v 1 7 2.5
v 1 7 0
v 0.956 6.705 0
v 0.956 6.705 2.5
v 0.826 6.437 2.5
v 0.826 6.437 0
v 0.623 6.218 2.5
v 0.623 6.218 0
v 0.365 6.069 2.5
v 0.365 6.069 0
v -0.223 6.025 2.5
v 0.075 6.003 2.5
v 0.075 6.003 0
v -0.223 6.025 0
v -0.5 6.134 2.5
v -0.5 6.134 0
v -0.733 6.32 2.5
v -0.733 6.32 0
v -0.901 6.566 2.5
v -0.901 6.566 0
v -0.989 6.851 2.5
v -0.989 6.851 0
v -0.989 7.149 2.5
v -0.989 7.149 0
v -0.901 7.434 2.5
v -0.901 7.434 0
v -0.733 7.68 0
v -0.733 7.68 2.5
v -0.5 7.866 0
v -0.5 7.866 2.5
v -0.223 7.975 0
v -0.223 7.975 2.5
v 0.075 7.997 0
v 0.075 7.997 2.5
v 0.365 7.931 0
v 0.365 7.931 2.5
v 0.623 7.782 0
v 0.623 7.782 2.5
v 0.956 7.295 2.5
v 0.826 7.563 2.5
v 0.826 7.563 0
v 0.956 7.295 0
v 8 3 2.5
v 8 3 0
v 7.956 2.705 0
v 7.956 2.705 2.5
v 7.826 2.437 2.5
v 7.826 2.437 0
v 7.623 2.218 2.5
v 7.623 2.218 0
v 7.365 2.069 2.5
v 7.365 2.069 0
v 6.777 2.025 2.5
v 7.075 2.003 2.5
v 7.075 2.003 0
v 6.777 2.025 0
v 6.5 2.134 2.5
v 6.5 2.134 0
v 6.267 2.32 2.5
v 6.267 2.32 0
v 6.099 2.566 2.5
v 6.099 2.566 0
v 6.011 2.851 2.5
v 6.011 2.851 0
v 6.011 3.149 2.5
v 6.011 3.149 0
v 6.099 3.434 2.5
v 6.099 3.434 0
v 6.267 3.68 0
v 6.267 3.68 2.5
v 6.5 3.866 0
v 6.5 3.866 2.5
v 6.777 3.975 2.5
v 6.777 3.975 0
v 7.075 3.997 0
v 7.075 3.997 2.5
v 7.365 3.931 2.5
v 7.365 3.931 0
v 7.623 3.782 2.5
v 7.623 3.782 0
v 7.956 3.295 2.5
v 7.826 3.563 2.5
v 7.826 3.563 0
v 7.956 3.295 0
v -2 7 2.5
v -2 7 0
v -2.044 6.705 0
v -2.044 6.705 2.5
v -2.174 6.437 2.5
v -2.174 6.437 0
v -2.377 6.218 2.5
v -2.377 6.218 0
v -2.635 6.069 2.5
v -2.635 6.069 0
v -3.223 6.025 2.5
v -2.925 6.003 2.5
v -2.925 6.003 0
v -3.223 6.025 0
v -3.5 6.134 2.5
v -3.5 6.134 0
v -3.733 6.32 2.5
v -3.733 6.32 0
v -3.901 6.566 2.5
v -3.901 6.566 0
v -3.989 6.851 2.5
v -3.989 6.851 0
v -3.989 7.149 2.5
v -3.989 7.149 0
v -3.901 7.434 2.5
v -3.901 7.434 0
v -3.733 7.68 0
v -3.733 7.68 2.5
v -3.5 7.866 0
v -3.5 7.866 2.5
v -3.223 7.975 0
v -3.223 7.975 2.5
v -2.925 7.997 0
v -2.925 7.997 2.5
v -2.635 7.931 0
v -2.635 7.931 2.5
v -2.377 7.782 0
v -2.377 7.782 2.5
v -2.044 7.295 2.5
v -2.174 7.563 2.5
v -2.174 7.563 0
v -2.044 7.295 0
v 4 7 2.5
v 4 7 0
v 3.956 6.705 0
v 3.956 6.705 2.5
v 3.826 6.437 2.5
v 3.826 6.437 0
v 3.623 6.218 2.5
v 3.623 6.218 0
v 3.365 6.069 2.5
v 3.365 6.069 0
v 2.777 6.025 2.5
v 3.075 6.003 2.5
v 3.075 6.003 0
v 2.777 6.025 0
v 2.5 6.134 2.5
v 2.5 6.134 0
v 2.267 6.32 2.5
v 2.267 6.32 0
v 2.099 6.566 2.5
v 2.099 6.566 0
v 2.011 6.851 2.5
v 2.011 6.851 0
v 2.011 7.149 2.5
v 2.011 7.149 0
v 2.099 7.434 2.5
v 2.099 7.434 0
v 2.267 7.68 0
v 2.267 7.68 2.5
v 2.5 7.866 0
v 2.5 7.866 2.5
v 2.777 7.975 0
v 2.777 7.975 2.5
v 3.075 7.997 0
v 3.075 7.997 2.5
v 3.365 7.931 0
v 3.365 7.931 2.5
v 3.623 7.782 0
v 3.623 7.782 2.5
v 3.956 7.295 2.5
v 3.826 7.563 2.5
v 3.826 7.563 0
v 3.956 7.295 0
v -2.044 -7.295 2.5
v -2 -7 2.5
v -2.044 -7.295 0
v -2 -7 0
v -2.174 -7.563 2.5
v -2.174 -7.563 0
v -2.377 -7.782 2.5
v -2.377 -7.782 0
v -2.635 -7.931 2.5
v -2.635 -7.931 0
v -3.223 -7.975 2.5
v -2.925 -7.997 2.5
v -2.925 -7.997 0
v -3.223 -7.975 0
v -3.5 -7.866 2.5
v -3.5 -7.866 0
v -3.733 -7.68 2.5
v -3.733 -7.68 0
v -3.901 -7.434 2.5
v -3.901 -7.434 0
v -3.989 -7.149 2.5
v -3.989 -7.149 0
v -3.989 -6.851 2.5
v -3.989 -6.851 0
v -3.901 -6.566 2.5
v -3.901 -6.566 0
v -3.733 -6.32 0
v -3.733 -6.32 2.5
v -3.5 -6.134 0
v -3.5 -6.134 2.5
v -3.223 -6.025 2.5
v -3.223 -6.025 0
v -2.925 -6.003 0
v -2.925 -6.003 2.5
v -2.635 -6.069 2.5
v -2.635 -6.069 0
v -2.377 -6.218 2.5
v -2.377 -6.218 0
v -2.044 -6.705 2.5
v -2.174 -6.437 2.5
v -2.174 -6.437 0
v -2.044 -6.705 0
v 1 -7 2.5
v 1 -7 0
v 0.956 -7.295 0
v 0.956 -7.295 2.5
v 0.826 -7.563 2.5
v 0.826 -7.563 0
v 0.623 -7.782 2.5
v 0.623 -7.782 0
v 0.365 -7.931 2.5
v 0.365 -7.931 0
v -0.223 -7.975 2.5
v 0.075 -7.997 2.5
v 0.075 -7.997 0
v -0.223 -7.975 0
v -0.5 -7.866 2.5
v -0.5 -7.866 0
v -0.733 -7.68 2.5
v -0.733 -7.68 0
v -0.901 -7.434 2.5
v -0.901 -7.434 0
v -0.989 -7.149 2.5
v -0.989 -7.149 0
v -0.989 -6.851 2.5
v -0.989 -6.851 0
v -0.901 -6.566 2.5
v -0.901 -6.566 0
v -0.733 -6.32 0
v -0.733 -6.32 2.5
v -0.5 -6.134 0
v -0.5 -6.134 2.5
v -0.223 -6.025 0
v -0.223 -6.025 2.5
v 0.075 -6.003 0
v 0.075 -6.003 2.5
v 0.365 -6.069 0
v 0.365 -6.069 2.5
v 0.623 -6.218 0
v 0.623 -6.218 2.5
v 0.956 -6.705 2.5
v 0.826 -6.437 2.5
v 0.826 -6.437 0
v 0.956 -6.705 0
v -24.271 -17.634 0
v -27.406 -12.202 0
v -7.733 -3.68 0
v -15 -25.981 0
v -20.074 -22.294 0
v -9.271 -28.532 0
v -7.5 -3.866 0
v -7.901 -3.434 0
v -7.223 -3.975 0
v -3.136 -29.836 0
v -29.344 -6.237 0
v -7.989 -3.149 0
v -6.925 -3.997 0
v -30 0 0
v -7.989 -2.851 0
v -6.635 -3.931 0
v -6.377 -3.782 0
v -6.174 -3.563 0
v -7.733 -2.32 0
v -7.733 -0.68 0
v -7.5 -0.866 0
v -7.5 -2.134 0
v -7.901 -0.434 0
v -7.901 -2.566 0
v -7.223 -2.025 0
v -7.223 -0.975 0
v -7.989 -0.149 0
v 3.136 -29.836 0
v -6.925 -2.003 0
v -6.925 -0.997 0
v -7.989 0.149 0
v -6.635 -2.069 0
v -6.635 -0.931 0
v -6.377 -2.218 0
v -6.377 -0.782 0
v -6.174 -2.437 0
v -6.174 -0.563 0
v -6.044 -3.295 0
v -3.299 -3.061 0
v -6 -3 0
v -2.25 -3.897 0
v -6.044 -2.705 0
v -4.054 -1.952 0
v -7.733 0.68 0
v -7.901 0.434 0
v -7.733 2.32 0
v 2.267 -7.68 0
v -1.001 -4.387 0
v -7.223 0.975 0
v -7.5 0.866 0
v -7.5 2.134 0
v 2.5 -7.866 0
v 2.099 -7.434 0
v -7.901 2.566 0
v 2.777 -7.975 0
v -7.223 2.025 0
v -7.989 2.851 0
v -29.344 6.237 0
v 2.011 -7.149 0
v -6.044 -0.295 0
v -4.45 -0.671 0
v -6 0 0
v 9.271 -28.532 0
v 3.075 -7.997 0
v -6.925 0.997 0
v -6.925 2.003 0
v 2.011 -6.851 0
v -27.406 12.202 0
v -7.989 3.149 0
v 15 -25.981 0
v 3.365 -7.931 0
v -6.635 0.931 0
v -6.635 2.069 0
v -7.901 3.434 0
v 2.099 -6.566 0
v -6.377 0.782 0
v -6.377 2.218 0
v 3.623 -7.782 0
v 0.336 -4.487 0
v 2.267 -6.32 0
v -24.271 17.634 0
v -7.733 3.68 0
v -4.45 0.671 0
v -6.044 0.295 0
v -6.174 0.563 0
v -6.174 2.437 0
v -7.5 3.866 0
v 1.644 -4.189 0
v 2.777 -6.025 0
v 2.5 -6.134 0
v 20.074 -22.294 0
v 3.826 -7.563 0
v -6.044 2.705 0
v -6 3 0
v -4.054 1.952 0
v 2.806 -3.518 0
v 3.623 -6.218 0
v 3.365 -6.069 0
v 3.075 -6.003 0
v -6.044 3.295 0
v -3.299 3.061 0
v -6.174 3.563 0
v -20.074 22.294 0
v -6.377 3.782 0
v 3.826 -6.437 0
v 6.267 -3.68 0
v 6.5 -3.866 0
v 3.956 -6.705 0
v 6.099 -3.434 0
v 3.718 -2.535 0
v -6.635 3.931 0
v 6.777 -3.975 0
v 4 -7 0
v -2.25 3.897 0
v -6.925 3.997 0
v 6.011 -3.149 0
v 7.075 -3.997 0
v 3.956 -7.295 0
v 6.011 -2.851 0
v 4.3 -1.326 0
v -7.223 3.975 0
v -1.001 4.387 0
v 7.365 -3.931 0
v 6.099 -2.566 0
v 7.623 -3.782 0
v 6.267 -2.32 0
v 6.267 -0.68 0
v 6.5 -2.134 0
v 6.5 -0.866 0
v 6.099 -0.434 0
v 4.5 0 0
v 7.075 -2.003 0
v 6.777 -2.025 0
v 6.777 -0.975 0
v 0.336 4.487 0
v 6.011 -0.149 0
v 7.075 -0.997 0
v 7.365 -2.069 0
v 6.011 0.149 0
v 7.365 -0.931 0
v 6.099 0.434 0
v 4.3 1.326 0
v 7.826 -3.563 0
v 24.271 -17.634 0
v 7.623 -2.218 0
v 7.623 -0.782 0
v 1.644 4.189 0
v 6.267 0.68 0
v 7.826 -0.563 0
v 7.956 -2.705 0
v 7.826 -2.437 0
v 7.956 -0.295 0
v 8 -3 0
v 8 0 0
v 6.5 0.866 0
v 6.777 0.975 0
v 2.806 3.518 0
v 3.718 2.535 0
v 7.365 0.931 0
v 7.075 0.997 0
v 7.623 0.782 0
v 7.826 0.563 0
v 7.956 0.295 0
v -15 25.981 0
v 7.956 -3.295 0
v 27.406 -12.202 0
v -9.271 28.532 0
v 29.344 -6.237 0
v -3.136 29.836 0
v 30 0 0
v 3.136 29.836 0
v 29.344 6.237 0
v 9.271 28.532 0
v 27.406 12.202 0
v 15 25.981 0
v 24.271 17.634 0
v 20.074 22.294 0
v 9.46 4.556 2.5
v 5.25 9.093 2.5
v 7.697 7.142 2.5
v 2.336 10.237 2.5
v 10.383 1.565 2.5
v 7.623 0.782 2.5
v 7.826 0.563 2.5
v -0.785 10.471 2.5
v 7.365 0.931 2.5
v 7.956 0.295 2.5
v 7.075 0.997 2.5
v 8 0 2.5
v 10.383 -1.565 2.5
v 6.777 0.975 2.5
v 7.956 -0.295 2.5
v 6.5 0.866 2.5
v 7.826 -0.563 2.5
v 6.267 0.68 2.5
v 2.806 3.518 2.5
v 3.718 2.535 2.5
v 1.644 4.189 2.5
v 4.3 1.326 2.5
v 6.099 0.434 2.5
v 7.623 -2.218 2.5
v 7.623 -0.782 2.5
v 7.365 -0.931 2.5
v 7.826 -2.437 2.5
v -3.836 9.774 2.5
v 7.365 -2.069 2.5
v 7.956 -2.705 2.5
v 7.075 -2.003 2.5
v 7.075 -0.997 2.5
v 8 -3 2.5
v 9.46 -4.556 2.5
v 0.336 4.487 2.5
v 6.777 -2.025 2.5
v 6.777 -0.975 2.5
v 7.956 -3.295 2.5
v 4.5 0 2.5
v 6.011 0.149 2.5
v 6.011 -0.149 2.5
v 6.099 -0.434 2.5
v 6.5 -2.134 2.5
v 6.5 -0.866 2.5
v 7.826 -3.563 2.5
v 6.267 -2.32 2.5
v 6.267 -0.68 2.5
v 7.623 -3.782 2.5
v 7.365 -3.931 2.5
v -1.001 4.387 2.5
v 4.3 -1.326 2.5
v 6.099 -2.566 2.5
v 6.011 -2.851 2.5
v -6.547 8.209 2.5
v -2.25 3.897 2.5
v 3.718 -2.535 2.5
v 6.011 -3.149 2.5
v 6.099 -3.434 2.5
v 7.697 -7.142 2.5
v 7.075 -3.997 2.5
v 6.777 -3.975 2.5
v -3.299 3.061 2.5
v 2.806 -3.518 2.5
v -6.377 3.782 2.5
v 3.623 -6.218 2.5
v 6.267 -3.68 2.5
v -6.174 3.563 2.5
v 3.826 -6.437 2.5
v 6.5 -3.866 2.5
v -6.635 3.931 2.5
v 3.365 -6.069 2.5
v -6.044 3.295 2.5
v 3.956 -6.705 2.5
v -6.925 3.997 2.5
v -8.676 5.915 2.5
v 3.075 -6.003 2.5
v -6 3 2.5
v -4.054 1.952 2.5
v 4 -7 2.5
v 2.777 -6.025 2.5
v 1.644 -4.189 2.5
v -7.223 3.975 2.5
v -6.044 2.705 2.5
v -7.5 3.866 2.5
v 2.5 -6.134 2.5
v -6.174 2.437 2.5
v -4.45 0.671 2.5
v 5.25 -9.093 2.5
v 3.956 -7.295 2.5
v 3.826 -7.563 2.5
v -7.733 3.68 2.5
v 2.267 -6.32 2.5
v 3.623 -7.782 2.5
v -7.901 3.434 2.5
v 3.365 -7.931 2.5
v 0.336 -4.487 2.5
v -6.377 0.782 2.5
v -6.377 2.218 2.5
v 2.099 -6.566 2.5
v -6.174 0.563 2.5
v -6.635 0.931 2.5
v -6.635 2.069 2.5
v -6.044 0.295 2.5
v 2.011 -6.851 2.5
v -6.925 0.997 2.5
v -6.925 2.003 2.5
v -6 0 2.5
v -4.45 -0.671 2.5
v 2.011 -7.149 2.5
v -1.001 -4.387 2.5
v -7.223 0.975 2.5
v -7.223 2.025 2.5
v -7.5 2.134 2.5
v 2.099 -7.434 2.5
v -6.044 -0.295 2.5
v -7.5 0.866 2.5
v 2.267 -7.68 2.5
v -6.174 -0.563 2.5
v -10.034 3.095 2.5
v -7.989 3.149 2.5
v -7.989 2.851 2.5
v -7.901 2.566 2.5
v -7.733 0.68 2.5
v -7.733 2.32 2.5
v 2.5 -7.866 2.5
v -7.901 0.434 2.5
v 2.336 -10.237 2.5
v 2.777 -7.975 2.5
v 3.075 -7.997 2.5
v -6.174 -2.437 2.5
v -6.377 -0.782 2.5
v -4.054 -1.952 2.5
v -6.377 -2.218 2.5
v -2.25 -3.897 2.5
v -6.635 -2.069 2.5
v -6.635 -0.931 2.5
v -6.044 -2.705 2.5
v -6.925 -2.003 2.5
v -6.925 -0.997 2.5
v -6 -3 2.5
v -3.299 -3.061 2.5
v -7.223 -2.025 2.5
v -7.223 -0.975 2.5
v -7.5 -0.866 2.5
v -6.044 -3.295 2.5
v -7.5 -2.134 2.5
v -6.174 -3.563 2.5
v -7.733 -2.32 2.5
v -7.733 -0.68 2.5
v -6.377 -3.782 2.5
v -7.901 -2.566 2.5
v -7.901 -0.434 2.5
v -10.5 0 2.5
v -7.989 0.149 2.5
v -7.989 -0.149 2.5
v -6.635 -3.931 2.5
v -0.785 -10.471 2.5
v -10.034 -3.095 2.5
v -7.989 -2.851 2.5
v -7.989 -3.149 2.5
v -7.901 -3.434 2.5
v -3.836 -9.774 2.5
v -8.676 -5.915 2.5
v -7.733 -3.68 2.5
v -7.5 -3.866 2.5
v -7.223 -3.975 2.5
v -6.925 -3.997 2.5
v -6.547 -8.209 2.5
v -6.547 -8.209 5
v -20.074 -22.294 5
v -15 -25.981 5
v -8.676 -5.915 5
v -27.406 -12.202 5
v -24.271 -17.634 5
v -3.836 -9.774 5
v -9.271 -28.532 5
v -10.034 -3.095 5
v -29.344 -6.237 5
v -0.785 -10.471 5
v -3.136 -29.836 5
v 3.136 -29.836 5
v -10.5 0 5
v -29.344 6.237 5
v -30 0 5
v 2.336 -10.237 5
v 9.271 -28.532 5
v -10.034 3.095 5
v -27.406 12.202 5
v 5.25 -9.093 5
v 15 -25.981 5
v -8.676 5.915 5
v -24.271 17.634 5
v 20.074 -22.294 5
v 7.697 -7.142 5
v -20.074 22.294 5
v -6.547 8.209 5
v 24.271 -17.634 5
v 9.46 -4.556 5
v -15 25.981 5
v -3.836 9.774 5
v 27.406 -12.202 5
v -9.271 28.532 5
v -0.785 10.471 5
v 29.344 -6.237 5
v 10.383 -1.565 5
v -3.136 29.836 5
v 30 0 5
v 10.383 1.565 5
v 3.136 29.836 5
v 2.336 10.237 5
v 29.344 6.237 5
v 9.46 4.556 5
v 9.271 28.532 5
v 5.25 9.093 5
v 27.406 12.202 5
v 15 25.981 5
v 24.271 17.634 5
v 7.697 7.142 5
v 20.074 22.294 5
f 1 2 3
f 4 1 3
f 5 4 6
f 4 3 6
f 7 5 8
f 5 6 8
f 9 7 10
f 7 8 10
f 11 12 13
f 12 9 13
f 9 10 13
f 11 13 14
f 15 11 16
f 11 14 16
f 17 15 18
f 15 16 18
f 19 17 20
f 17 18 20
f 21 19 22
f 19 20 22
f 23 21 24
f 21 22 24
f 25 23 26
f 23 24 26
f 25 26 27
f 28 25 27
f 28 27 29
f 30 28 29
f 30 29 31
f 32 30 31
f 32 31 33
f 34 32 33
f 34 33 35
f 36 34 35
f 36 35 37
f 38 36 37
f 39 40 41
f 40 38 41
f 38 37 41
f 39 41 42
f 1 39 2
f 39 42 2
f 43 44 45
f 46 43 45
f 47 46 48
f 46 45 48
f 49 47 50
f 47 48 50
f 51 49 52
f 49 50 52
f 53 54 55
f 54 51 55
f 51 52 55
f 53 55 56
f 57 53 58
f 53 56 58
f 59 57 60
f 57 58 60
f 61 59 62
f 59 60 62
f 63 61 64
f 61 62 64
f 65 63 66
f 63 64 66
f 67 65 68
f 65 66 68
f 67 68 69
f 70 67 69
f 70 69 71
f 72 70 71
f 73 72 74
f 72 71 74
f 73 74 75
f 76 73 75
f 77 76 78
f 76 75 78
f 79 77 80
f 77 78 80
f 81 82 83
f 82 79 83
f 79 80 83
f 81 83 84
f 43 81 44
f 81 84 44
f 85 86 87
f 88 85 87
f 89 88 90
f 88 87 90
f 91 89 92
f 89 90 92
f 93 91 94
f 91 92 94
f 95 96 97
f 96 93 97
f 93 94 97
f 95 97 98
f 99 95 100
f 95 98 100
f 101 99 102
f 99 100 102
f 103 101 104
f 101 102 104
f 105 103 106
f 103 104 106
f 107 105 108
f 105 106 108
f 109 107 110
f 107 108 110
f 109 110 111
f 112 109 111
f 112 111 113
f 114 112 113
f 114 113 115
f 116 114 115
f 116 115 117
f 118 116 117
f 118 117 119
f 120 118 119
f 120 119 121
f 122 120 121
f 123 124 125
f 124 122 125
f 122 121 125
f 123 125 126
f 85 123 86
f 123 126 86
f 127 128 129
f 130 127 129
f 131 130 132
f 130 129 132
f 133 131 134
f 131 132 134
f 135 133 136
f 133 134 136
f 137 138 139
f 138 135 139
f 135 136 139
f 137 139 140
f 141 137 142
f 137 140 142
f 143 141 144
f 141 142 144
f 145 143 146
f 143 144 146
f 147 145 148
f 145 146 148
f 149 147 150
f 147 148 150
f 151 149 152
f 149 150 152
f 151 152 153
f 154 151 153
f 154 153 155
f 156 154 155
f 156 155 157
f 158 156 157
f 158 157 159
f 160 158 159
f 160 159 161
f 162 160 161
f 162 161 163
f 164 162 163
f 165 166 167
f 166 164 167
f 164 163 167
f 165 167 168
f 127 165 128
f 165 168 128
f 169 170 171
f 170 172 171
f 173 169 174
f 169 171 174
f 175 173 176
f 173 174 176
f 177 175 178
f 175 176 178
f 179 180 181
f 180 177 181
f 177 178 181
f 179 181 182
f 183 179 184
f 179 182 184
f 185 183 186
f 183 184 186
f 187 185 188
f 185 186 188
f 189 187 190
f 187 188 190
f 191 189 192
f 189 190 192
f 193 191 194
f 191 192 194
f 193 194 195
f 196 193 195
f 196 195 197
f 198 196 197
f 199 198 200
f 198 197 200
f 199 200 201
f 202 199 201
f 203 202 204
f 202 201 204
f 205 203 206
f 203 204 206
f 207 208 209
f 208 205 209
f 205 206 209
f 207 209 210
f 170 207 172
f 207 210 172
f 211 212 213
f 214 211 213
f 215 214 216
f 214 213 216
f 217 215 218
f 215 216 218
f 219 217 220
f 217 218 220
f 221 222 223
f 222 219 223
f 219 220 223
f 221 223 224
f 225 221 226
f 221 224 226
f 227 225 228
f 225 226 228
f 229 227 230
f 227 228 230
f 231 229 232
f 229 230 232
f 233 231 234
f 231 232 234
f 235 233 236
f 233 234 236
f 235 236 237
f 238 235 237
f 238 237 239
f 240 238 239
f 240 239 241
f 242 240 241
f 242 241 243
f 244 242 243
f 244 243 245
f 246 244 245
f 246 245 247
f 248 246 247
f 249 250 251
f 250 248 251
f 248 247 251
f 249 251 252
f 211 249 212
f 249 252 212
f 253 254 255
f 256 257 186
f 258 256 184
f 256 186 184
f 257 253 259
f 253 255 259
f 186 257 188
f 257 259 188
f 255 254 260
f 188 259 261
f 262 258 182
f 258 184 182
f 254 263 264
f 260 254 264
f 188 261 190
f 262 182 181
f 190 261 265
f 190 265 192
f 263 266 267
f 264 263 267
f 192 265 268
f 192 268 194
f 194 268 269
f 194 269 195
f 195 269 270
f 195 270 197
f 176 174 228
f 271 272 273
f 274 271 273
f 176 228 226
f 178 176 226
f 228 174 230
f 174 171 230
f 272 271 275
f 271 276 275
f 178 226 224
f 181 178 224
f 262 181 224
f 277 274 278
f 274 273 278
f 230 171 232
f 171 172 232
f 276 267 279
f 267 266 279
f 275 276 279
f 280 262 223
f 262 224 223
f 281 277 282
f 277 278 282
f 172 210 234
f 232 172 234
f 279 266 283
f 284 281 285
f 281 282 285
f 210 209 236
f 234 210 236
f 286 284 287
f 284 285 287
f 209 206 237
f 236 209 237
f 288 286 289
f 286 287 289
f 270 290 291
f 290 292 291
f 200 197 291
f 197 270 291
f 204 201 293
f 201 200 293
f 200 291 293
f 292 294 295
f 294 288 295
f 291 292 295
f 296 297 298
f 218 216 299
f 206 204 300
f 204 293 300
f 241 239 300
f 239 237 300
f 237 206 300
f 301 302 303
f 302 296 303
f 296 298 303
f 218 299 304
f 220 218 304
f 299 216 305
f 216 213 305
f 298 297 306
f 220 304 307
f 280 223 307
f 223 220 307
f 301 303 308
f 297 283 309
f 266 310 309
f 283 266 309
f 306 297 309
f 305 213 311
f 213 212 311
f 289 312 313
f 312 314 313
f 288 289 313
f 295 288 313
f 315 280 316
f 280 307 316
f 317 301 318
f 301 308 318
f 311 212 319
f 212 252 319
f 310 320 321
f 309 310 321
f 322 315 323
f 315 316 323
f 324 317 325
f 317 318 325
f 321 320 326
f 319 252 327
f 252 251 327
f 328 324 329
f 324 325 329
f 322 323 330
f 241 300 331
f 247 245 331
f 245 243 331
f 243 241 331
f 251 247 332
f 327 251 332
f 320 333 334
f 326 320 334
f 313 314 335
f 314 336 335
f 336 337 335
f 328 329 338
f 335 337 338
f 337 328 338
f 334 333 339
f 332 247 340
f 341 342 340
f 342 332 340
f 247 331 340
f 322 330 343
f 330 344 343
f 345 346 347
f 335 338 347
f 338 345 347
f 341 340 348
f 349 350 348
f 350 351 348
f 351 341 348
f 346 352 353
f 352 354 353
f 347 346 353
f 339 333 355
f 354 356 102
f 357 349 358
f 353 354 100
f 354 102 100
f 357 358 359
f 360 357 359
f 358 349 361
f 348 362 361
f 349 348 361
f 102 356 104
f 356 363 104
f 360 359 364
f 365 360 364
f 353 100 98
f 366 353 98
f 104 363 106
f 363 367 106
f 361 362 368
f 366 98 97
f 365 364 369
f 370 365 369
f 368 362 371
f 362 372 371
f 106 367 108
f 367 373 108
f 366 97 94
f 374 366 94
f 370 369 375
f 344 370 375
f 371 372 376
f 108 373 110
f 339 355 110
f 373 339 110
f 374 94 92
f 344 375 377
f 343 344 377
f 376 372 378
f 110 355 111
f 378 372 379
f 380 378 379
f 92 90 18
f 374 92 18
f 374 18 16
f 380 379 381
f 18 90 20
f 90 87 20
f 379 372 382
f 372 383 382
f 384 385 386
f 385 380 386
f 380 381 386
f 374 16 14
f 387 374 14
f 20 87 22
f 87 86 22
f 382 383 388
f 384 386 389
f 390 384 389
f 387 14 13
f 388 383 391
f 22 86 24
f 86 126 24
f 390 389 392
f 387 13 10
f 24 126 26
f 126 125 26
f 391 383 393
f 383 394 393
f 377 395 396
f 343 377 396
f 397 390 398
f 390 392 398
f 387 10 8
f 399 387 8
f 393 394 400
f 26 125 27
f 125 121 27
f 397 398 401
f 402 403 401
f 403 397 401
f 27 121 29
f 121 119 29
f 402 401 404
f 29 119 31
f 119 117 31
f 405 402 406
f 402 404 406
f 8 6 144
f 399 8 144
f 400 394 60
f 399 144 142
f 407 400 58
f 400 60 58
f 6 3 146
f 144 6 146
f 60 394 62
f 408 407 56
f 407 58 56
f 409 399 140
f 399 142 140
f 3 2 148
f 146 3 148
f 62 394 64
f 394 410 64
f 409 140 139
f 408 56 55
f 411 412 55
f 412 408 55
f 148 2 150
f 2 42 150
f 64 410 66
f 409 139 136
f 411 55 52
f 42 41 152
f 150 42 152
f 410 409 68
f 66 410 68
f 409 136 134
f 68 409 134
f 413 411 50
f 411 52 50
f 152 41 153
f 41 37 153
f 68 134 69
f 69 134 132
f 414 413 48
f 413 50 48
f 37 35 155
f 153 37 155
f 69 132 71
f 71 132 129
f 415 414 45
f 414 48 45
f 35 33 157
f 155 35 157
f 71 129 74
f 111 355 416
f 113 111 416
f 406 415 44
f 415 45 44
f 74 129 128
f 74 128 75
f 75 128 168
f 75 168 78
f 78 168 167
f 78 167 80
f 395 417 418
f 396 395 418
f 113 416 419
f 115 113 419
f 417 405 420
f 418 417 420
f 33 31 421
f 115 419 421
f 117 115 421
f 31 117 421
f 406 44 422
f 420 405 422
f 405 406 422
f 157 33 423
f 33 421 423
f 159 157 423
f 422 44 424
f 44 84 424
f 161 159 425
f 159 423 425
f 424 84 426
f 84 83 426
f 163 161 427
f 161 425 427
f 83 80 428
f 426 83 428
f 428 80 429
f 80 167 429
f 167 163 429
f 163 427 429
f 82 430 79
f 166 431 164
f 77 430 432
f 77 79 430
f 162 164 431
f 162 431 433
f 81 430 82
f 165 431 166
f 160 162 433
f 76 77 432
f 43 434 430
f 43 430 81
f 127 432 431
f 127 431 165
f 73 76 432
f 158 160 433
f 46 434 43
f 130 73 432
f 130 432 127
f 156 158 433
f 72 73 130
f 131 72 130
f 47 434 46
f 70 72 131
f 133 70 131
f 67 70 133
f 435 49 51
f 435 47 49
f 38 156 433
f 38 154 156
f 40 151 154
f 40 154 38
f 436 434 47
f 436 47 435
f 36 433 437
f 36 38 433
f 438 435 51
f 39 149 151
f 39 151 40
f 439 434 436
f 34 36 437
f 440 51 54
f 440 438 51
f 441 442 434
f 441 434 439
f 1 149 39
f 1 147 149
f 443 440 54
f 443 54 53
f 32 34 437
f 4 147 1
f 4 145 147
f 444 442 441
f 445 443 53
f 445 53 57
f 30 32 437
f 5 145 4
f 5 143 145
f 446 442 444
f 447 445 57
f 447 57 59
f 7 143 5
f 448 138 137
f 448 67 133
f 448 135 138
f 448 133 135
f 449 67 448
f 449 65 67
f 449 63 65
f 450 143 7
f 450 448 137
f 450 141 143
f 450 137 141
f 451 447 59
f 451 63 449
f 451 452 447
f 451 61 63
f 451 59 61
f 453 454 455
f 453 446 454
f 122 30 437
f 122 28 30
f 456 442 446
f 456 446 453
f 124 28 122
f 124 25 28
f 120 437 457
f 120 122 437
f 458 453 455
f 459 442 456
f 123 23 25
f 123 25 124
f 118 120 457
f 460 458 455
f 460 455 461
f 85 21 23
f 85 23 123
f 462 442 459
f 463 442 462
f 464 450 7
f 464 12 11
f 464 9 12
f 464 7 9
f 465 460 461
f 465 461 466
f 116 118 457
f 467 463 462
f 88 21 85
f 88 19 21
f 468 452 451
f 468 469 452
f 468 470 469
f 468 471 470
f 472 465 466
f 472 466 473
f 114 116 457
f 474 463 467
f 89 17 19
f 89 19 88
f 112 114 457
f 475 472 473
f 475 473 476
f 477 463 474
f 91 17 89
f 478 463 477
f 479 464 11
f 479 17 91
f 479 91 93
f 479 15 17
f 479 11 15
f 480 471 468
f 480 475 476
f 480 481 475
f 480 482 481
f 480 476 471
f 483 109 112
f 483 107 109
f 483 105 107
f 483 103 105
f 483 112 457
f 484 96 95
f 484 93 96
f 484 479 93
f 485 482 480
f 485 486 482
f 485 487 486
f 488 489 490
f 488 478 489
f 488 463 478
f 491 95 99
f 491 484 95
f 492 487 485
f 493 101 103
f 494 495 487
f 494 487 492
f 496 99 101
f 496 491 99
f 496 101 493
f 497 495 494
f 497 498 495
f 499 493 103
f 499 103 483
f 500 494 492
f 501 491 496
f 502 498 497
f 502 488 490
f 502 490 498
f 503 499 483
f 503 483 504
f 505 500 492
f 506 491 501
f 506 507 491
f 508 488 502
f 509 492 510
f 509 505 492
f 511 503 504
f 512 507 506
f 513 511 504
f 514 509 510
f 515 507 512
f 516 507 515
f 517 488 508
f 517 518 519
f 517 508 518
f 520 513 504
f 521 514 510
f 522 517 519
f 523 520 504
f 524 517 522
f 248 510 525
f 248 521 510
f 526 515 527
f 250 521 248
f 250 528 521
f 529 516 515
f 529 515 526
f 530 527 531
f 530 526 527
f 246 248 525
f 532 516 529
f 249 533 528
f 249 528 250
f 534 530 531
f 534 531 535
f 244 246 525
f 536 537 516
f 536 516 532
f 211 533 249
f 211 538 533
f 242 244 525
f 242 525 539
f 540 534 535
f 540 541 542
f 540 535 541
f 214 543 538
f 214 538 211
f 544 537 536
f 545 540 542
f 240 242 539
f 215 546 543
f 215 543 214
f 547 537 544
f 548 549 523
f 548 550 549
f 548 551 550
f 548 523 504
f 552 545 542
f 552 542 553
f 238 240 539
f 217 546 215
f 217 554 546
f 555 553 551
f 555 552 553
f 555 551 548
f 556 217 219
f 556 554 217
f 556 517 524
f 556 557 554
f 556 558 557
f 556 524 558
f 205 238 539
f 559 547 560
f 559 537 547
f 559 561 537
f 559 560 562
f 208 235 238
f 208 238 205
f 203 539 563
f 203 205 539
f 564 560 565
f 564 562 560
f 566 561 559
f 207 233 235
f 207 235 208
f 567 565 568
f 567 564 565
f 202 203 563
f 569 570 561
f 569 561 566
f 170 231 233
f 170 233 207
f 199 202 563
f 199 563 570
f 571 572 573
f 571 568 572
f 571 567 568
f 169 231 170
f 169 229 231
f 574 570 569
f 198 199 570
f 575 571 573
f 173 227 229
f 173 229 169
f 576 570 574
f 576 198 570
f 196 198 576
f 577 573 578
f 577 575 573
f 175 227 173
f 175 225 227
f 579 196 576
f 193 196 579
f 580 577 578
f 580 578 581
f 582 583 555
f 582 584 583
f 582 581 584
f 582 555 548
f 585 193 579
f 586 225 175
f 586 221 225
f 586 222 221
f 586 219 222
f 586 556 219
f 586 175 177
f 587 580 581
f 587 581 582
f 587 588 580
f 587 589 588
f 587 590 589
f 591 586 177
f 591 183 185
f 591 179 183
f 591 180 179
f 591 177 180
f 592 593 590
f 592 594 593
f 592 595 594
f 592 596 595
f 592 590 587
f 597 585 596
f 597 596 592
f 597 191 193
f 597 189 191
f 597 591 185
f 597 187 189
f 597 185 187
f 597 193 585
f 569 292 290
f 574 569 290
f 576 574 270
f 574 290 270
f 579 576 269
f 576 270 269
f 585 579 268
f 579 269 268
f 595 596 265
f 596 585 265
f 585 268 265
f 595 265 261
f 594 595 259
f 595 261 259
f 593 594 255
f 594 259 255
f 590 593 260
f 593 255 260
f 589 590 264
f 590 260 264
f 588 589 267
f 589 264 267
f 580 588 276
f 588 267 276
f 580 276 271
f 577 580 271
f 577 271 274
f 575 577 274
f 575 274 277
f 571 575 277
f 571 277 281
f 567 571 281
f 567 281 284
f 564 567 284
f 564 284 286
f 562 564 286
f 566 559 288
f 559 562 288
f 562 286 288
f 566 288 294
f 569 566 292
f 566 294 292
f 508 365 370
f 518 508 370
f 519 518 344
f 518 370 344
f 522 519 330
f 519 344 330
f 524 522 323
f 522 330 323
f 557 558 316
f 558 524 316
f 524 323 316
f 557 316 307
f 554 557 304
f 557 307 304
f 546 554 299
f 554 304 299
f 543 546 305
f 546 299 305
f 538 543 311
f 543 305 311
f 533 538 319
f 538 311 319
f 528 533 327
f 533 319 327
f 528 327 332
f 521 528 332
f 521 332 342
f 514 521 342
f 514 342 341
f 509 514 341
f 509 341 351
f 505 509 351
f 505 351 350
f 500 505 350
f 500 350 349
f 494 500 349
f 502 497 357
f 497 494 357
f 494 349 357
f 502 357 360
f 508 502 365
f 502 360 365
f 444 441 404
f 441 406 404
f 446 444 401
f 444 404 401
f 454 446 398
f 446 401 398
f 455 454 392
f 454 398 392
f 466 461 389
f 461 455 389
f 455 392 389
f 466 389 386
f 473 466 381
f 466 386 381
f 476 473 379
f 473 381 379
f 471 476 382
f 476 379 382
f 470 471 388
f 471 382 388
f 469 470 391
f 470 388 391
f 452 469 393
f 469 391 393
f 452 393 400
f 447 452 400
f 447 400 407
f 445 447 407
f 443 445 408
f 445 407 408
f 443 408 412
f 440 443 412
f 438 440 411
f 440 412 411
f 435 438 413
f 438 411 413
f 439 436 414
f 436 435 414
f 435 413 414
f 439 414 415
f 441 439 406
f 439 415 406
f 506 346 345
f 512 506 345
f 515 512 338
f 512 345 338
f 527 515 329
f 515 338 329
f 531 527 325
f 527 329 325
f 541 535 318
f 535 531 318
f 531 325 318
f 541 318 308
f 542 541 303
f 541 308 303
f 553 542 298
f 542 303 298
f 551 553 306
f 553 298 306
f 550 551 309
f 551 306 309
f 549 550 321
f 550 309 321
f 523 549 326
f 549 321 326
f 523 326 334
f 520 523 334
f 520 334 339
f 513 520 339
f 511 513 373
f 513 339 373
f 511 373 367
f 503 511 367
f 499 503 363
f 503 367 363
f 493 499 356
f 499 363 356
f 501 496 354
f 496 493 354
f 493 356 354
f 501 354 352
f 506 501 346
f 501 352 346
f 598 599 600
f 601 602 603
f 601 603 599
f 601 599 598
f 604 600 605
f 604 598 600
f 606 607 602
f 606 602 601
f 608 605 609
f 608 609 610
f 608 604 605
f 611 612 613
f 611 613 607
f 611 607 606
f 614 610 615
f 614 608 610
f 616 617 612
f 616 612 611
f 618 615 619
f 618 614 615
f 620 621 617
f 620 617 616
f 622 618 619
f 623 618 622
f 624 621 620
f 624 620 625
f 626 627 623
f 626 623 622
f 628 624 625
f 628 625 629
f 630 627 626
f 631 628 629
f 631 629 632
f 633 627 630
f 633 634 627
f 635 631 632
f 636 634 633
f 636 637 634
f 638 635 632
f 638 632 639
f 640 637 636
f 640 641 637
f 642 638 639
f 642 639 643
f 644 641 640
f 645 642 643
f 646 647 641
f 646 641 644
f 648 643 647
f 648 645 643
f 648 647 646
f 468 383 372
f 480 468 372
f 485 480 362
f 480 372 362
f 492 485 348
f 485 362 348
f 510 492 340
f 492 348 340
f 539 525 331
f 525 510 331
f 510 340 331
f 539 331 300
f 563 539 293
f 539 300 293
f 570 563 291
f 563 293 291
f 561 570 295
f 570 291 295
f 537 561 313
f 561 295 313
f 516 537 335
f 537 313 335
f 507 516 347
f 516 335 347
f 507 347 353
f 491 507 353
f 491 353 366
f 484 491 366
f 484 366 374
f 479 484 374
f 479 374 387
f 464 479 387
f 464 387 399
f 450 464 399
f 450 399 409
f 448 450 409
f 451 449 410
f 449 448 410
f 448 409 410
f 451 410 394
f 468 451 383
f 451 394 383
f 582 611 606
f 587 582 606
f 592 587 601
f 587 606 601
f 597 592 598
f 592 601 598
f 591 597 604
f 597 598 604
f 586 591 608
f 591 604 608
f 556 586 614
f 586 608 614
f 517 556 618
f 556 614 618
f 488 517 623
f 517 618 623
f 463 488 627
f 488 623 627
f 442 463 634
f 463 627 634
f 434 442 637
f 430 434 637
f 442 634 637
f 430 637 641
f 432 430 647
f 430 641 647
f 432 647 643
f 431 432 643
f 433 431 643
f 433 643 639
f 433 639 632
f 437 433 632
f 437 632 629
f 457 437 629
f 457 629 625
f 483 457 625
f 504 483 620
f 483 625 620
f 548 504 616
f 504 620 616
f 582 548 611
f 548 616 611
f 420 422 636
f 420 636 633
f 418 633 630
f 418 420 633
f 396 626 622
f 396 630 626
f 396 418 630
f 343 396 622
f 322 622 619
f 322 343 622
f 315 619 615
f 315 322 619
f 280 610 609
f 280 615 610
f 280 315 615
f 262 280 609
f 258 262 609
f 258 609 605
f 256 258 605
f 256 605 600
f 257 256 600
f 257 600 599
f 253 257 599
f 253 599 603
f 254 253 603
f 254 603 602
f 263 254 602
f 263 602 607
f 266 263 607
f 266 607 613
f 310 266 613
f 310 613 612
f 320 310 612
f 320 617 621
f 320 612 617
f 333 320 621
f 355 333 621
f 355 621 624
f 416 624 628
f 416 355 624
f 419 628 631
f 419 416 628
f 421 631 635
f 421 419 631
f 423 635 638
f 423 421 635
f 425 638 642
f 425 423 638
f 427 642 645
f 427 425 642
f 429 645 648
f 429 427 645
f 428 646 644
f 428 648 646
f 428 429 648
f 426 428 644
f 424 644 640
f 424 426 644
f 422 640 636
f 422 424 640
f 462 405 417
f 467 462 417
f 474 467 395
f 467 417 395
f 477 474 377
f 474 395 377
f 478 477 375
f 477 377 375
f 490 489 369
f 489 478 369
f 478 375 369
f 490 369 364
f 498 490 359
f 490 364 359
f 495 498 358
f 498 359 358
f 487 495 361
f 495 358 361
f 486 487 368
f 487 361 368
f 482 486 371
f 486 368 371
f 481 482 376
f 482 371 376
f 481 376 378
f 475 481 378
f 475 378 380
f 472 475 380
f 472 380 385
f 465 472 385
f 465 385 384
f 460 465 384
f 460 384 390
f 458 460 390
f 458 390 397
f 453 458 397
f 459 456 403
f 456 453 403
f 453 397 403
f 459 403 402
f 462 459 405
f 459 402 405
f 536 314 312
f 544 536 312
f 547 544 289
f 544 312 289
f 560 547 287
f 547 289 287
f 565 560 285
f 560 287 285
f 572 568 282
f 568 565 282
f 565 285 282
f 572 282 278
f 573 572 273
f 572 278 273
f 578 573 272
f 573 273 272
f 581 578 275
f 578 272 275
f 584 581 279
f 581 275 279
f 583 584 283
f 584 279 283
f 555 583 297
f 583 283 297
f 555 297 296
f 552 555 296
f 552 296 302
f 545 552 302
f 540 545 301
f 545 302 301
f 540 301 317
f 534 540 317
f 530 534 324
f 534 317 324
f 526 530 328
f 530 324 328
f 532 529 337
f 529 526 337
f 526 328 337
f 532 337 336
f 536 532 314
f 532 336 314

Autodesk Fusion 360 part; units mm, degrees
sketch "Sketch1" plane through (0, 0, 0) normal (0, 0, 1) x (1, 0, 0)
  circle A0 centre (0, 0) radius 30
  circle A1 centre (0, 0) radius 4.5
  line L0 (7, -7) -> (-7, -7)
  line L1 (-7, -7) -> (-7, 7)
  line L2 (-7, 7) -> (7, 7)
  line L3 (7, 7) -> (7, -7)
  line L4 (7, -7) -> (-7, 7) construction
  line L5 (-7, -7) -> (7, 7) construction
  line L6 (7, 0) -> (7, 4)
  line L7 (7, 0) -> (7, -4)
  circle A2 centre (7, 3) radius 1
  circle A3 centre (7, 0) radius 1
  circle A4 centre (7, -3) radius 1
  circle A5 centre (-3, 7) radius 1
  circle A6 centre (0, 7) radius 1
  circle A7 centre (3, 7) radius 1
  circle A8 centre (-7, -3) radius 1
  circle A9 centre (-7, 0) radius 1
  circle A10 centre (-7, 3) radius 1
  circle A11 centre (3, -7) radius 1
  circle A12 centre (0, -7) radius 1
  circle A13 centre (-3, -7) radius 1
  dimension "d1" = 60
  dimension "d2" = 9
  dimension "d3" = 14
  dimension "d4" = 14
  dimension "d5" = 4
  dimension "d6" = 4
  dimension "d7" = 2
  dimension "d8" = 2
  dimension "d11" = 0
  dimension "d12" = 0
  dimension "d14" = 360
extrude "Extrude1" add sketch "Sketch1" along normal blind 5 contours A0 | L0 L1 L2 L3 L6 L7 A2 A3 A4 A5 A6 A7 A8 A9 A10 A11 A12 A13
sketch "Sketch2" plane through (0, 0, 5) normal (0, 0, 1) x (-1, 0, 0)
  circle A0 centre (-7, 3) radius 1
  circle A1 centre (3, 7) radius 1
  circle A2 centre (0, 7) radius 1
  circle A3 centre (0, -7) radius 1
  circle A4 centre (-3, 7) radius 1
  circle A5 centre (3, -7) radius 1
  circle A6 centre (0, 0) radius 4.5
  circle A7 centre (-7, -3) radius 1
  circle A8 centre (-7, 0) radius 1
  circle A9 centre (7, 0) radius 1
  circle A10 centre (-3, -7) radius 1
  circle A11 centre (7, -3) radius 1
  circle A12 centre (7, 3) radius 1
  circle A13 centre (0, 0) radius 30
  circle A14 centre (0, 0) radius 10.5
  dimension "d17" = 21
extrude "Extrude2" cut sketch "Sketch2" against normal blind 2.5 contours A14
